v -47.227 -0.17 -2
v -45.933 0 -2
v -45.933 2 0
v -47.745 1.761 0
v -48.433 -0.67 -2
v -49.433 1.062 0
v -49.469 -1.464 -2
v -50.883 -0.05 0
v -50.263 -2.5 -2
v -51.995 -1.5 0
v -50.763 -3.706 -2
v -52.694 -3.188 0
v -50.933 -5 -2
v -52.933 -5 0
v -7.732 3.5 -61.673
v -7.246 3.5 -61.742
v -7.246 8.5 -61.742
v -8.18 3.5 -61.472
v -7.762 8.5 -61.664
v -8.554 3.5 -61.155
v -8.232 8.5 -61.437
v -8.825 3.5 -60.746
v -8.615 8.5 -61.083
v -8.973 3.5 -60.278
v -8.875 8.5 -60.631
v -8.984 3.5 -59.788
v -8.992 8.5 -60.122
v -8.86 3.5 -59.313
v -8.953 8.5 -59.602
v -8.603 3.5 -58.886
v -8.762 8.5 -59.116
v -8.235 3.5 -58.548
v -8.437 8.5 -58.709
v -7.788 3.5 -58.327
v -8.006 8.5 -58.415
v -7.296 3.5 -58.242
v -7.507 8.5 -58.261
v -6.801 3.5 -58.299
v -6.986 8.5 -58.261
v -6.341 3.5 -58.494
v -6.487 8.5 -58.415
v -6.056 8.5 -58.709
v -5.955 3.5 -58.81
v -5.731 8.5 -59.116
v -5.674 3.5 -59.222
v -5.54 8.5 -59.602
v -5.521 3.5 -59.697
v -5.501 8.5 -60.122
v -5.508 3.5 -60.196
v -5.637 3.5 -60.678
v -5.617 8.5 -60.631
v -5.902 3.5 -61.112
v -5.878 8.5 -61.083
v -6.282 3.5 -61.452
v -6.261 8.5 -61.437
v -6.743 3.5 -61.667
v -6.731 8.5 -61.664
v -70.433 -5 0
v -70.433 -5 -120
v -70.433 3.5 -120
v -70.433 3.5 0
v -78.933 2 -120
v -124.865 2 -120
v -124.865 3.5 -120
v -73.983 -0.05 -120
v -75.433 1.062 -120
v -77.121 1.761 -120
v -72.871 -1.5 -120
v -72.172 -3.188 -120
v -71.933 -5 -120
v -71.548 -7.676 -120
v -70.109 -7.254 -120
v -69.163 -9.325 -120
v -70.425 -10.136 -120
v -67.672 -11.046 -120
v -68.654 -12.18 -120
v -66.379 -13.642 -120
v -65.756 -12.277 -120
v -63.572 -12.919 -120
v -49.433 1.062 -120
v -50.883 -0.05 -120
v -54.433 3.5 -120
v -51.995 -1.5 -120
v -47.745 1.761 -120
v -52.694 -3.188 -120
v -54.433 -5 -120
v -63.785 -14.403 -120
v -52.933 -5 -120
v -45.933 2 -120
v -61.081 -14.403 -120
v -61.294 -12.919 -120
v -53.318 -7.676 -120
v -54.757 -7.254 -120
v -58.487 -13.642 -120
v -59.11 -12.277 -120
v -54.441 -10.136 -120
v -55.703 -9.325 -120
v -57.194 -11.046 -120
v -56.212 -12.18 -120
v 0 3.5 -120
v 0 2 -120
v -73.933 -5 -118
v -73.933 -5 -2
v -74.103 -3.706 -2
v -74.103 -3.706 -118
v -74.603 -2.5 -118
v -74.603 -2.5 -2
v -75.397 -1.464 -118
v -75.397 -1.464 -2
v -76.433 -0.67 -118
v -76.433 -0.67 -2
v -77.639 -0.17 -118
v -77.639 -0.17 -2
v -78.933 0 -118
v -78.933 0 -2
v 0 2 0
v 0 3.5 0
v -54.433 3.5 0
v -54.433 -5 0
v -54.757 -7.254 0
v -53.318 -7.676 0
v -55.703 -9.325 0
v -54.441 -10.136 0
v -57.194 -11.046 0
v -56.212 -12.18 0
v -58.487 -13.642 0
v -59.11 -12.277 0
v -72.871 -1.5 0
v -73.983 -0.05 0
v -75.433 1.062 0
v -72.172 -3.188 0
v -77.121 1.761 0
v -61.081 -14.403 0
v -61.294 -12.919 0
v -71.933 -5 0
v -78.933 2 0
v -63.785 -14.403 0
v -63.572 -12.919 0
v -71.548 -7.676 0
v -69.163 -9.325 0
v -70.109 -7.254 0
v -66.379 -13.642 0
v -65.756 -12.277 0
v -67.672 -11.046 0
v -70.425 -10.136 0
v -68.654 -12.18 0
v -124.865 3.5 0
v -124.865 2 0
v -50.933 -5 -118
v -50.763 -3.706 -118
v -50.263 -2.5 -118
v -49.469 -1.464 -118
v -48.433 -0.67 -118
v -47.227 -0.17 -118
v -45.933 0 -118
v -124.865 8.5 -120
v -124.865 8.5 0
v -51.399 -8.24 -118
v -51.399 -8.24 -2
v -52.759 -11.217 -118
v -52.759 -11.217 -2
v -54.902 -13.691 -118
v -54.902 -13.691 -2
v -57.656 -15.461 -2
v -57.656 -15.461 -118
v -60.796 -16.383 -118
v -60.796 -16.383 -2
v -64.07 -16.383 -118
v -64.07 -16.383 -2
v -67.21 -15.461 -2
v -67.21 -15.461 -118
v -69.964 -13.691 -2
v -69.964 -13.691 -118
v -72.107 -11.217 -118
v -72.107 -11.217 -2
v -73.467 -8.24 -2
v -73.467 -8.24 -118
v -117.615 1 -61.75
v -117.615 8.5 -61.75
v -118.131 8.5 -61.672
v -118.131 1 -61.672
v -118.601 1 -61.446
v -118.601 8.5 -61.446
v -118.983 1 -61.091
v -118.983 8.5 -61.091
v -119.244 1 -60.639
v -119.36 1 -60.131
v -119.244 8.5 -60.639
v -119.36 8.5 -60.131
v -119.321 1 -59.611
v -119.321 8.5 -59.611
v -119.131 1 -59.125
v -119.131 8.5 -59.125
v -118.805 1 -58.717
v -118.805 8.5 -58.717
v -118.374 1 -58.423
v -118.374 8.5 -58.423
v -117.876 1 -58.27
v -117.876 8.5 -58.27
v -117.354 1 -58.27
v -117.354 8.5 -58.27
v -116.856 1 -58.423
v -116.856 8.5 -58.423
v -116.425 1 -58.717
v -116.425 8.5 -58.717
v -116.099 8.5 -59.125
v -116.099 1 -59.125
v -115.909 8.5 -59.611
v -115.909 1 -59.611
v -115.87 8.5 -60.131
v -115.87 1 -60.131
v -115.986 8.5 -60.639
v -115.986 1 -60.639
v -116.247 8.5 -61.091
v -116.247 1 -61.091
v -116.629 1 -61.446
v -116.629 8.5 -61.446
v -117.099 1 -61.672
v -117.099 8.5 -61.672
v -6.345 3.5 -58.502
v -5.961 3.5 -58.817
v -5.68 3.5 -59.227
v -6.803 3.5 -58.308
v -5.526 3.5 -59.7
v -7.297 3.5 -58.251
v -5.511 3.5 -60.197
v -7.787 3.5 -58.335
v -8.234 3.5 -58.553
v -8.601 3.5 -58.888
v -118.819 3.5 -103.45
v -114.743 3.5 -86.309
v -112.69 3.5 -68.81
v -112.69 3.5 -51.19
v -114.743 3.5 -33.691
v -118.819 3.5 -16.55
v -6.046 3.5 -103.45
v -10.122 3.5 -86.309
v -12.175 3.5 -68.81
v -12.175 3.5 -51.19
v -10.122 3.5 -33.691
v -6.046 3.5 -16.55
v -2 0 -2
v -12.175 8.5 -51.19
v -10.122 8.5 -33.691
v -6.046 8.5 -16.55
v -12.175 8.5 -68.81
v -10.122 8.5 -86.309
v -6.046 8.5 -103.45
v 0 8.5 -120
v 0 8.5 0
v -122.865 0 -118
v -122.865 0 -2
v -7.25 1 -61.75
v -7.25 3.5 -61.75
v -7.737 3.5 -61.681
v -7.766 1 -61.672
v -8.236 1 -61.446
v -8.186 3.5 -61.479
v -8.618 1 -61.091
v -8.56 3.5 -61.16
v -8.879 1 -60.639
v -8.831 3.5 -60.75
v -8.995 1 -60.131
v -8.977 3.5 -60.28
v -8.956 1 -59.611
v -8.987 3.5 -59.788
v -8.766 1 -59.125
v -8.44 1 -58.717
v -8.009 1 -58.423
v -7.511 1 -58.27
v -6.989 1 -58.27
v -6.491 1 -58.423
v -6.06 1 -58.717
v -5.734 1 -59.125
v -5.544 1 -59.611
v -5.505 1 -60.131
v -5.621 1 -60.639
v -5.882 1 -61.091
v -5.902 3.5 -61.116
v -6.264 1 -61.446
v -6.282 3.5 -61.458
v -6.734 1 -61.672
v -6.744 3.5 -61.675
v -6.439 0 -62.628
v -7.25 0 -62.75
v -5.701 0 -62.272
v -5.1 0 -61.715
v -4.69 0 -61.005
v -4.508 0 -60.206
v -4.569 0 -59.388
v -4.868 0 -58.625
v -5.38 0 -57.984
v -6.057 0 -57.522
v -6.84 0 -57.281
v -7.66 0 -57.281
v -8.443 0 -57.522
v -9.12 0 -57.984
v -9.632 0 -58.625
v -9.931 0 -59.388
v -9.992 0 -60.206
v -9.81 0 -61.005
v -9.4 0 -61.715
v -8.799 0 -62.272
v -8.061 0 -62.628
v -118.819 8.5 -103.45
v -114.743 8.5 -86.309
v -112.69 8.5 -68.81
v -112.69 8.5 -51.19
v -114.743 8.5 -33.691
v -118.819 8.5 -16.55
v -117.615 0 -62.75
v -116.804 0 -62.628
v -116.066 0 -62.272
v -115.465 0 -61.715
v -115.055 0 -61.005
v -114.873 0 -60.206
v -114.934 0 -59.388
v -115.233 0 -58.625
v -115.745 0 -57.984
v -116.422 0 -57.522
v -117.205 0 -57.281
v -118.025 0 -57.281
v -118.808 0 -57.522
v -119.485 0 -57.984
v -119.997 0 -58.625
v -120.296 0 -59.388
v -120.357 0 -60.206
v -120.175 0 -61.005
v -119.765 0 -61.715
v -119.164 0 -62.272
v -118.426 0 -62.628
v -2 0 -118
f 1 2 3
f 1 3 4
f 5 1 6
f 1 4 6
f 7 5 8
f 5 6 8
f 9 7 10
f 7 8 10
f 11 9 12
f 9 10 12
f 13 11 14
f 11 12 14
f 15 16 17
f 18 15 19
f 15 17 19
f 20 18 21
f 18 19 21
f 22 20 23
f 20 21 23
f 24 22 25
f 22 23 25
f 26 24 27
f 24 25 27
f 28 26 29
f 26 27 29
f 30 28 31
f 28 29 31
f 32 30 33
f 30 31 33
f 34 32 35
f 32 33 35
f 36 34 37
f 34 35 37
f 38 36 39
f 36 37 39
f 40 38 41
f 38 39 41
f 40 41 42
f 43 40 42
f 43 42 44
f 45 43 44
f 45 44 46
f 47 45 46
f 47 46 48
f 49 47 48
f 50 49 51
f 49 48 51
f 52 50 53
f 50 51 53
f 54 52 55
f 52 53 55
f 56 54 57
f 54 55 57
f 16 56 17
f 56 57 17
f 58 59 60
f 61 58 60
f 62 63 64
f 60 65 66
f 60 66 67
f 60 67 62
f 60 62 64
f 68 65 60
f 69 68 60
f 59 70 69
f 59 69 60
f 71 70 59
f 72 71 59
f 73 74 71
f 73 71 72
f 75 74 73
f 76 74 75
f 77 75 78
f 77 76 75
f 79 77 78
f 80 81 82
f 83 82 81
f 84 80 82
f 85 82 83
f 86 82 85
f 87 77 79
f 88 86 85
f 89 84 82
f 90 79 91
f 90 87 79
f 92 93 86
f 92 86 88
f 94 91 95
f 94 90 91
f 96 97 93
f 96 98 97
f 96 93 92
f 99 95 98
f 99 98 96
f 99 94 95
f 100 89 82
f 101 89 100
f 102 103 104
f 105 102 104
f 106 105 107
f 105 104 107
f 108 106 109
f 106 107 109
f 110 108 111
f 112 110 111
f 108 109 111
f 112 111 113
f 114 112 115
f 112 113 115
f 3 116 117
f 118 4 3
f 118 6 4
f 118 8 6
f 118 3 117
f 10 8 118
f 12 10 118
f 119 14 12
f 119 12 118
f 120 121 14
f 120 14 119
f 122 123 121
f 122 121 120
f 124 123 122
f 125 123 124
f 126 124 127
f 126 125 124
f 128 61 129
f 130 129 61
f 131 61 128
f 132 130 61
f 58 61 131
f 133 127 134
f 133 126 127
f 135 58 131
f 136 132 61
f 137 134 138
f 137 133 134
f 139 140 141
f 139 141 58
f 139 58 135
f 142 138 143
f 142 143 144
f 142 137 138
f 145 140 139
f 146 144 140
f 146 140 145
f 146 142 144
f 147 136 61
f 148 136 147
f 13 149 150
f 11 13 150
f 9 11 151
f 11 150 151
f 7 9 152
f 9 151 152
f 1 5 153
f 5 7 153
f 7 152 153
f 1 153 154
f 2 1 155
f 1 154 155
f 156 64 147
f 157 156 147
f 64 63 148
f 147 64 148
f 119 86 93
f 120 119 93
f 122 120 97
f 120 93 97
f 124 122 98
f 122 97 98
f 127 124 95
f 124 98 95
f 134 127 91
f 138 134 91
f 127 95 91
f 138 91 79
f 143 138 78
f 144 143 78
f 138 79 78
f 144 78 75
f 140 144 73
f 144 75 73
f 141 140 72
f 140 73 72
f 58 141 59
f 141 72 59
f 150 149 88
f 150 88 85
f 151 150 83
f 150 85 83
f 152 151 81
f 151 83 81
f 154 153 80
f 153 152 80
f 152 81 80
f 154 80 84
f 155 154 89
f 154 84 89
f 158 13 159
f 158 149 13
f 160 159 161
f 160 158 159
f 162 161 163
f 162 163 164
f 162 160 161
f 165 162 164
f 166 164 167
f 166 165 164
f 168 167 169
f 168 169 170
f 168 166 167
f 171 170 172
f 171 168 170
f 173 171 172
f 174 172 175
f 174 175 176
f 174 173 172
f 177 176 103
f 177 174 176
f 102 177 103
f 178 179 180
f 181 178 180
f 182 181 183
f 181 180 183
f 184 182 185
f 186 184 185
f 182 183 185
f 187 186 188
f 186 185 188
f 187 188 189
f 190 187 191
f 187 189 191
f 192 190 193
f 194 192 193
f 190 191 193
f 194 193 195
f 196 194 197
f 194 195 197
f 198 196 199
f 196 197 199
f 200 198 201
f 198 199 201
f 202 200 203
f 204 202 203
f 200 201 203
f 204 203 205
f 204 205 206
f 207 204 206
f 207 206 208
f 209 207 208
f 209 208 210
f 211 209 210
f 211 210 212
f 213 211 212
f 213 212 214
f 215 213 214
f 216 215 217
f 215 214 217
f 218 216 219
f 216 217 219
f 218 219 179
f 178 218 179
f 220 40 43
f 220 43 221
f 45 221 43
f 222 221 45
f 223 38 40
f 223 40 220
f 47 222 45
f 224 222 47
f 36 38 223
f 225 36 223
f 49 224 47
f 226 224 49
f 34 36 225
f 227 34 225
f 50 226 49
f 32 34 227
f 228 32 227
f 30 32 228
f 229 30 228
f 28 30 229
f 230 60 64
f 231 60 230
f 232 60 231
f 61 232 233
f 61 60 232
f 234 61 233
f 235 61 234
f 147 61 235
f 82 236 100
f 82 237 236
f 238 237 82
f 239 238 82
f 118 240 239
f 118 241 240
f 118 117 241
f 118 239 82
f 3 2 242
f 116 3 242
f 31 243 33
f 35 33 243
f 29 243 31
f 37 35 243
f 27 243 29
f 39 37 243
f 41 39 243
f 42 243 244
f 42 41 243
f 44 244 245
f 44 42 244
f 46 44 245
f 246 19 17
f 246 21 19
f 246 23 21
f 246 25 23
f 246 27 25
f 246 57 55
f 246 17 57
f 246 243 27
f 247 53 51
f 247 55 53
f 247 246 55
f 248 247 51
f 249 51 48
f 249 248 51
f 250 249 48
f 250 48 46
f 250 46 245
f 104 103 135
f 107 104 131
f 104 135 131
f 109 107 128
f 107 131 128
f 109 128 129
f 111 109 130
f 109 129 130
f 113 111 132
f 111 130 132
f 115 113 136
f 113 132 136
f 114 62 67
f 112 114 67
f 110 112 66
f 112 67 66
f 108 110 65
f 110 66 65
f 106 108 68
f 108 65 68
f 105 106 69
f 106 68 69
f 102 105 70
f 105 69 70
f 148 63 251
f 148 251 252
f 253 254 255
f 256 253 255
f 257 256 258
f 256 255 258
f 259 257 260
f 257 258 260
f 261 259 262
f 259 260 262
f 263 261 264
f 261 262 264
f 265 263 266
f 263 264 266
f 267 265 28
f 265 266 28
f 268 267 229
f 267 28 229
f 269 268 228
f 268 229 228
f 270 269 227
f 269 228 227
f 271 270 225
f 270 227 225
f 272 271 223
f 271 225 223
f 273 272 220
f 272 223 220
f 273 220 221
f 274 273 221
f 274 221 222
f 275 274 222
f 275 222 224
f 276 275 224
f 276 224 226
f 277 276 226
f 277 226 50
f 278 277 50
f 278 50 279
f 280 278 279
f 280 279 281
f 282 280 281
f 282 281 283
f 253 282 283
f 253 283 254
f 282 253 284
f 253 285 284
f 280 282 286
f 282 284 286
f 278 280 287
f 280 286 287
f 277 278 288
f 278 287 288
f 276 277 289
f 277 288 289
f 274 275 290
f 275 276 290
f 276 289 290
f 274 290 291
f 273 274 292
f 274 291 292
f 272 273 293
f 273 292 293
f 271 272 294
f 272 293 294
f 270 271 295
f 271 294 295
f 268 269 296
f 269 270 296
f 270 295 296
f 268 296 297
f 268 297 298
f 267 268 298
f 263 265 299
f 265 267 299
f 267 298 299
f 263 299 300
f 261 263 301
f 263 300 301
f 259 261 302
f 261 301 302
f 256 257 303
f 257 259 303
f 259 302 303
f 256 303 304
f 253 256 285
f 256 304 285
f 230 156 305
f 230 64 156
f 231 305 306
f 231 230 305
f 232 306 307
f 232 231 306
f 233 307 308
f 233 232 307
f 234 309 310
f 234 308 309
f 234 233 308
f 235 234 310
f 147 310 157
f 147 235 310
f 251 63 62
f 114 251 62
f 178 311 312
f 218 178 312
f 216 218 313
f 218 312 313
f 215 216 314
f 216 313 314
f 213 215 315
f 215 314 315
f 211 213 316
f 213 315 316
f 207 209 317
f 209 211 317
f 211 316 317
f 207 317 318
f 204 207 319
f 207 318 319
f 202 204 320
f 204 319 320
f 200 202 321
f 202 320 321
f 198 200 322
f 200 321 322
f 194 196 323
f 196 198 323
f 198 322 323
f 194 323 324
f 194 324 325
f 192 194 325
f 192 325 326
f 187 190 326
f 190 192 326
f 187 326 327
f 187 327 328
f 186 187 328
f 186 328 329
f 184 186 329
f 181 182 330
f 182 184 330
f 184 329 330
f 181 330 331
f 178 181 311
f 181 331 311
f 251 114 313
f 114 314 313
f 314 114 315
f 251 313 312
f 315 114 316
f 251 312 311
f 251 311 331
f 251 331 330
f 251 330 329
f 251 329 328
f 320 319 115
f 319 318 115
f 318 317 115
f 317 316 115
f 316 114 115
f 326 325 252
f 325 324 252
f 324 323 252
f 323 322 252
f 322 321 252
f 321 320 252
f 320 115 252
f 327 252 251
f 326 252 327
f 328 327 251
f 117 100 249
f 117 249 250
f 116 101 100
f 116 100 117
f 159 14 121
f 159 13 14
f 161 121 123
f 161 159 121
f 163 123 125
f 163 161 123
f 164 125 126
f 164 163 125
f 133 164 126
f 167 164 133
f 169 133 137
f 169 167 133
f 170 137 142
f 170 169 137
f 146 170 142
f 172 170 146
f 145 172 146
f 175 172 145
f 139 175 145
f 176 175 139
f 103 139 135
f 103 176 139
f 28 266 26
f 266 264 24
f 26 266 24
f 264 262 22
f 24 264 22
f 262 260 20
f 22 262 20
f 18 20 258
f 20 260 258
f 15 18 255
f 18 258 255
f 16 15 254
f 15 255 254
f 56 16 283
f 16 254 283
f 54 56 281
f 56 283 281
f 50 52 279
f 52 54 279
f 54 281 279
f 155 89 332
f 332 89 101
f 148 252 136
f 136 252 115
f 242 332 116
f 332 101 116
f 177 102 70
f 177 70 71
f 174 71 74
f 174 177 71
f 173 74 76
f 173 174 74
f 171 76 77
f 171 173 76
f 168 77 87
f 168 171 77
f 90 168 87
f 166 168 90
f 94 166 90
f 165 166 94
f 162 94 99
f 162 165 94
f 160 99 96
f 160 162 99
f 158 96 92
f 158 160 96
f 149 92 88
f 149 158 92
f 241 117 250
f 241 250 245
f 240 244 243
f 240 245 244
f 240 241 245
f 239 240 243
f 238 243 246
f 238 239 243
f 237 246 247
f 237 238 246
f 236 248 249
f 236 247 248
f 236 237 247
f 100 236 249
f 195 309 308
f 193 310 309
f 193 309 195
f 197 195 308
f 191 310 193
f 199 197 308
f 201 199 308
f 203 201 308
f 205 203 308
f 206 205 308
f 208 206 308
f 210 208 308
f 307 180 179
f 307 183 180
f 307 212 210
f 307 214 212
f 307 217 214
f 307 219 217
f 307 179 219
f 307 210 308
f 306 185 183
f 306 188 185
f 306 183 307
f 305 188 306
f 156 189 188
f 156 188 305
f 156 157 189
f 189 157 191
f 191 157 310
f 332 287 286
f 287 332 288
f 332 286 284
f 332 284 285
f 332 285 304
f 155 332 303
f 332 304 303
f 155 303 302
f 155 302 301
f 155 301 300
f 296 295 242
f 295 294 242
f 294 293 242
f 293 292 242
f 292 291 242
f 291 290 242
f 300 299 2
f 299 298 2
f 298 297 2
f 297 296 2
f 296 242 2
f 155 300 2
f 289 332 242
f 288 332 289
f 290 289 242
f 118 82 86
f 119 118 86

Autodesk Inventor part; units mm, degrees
ref_plane "YZ Plane" through (0, 0, 0) normal (1, 0, 0) x (0, 1, 0)
ref_plane "XZ Plane" through (0, 0, 0) normal (0, 1, 0) x (-1, 0, 0)
ref_plane "XY Plane" through (0, 0, 0) normal (0, 0, 1) x (1, 0, 0)
sketch "Sketch1" plane through (0, 0, 0) normal (0, 1, 0) x (-1, 0, 0)
  line L0 (0, 0) -> (124.865, 0)
  line L1 (124.865, 0) -> (124.865, -120)
  line L2 (124.865, -120) -> (0, -120)
  line L3 (0, -120) -> (0, 0)
  dimension "d0" = 124.865
  dimension "d1" = 120
extrude "Extrusion1" add sketch "Sketch1" along normal blind 3.5
sketch "Sketch2" plane through (0, 0, 0) normal (0, -1, 0) x (1, 0, 0)
  circle A0 centre (-117.615, -60) radius 1.75
  circle A1 centre (-7.25, -60) radius 1.75
  line L0 (-124.865, 0) -> (-124.865, -120) projected
  line L1 (0, 0) -> (-124.865, 0) projected
  line L2 (0, -120) -> (0, 0) projected
  dimension "d4" = 3.5
  dimension "d5" = 3.5
  dimension "d6" = 7.25
  dimension "d7" = 60
  dimension "d8" = 7.25
  dimension "d9" = 60
hole "Hole1" at (-7.25, 0, -60) at (-117.615, 0, -60) direction (0, 1, 0) diameter 3.5 end through all countersink diameter 5.5 countersink angle 90
sketch "Sketch3" plane through (0, 0, -120) normal (0, 0, -1) x (-1, 0, 0)
  line L0 (73.933, -5) -> (73.933, 0)
  line L1 (70.433, 0) -> (70.433, -5)
  line L2 (50.933, 0) -> (50.933, -5)
  line L3 (54.433, -5) -> (54.433, 0)
  arc A0 (54.433, -5) -> (70.433, -5) centre (62.433, -5) ccw
  arc A1 (50.933, -5) -> (73.933, -5) centre (62.433, -5) ccw
  line L4 (73.933, 0) -> (73.933, 3.5)
  line L5 (0, 3.5) -> (124.865, 3.5) projected
  line L6 (50.933, 0) -> (50.933, 3.5)
  line L7 (73.933, 3.5) -> (50.933, 3.5)
  line L8 (70.433, 0) -> (54.433, 0)
  line L9 (124.865, 0) -> (0, 0) projected
  dimension "d22" = 3.5
  dimension "d24" = 3.5
extrude "Extrusion2" add sketch "Sketch3" against normal blind 120
sketch "Sketch4" plane through (0, 3.5, -120) normal (0, 0, -1) x (-1, 0, 0)
  line L0 (124.865, -3.5) -> (124.865, 0) projected
  line L1 (70.433, -3.5) -> (70.433, -8.5)
  line L2 (54.433, -3.5) -> (54.433, -8.5)
  arc A0 (54.433, -8.5) -> (70.433, -8.5) centre (62.433, -8.5) ccw
  line L3 (70.433, -3.5) -> (70.433, 0)
  line L4 (70.433, 0) -> (54.433, 0)
  line L5 (54.433, 0) -> (54.433, -3.5)
  point P0 (0, -3.5)
extrude "Extrusion3" cut sketch "Sketch4" against normal blind 120
sketch "Sketch5" plane through (0, 3.5, 0) normal (0, 1, 0) x (1, 0, 0)
  line L0 (0, 120) -> (0, 0) projected
  arc A0 (0, 120) -> (0, 0) centre (138.5716, 60) ccw
  line L1 (-70.433, 120) -> (-124.865, 120) projected
  arc A1 (-124.865, 0) -> (-124.865, 120) centre (-262.4456, 60) ccw
extrude "Extrusion4" add sketch "Sketch5" along normal blind 5
sketch "Sketch6" plane through (0, 3.5, 0) normal (0, 1, 0) x (1, 0, 0)
  line L0 (-124.865, 120) -> (-124.865, 0) projected
  arc A0 (-124.865, 0) -> (-124.865, 120) centre (-263.4366, 60) ccw
  point P0 (0, 0)
extrude "Extrusion5" add sketch "Sketch6" along normal blind 5
hole "Hole3" at (-117.615, 3.5, -60) direction (0, 1, 0) diameter 3.5 end through all
hole "Hole4" at (-7.2464, 3.5, -59.9915) direction (0, 1, 0) diameter 3.5 end through all
fillet "Fillet2" radius 5 2 edges at (-50.933, 0, -60) (-73.933, 0, -60)
chamfer "Chamfer1" distance 2 angle 45 12 edges at (-124.865, 0, -60) (0, 0, -60) (-62.433, -16.5, -120) (-49.4686, -1.4644, -120) (-22.9665, 0, -120) (-75.3974, -1.4644, -120) (-101.8989, 0, -120) (-62.433, -16.5, 0) (-49.4686, -1.4644, 0) (-22.9665, 0, 0) (-75.3974, -1.4644, 0) (-101.8989, 0, 0)
properties part number "FinalBack"
